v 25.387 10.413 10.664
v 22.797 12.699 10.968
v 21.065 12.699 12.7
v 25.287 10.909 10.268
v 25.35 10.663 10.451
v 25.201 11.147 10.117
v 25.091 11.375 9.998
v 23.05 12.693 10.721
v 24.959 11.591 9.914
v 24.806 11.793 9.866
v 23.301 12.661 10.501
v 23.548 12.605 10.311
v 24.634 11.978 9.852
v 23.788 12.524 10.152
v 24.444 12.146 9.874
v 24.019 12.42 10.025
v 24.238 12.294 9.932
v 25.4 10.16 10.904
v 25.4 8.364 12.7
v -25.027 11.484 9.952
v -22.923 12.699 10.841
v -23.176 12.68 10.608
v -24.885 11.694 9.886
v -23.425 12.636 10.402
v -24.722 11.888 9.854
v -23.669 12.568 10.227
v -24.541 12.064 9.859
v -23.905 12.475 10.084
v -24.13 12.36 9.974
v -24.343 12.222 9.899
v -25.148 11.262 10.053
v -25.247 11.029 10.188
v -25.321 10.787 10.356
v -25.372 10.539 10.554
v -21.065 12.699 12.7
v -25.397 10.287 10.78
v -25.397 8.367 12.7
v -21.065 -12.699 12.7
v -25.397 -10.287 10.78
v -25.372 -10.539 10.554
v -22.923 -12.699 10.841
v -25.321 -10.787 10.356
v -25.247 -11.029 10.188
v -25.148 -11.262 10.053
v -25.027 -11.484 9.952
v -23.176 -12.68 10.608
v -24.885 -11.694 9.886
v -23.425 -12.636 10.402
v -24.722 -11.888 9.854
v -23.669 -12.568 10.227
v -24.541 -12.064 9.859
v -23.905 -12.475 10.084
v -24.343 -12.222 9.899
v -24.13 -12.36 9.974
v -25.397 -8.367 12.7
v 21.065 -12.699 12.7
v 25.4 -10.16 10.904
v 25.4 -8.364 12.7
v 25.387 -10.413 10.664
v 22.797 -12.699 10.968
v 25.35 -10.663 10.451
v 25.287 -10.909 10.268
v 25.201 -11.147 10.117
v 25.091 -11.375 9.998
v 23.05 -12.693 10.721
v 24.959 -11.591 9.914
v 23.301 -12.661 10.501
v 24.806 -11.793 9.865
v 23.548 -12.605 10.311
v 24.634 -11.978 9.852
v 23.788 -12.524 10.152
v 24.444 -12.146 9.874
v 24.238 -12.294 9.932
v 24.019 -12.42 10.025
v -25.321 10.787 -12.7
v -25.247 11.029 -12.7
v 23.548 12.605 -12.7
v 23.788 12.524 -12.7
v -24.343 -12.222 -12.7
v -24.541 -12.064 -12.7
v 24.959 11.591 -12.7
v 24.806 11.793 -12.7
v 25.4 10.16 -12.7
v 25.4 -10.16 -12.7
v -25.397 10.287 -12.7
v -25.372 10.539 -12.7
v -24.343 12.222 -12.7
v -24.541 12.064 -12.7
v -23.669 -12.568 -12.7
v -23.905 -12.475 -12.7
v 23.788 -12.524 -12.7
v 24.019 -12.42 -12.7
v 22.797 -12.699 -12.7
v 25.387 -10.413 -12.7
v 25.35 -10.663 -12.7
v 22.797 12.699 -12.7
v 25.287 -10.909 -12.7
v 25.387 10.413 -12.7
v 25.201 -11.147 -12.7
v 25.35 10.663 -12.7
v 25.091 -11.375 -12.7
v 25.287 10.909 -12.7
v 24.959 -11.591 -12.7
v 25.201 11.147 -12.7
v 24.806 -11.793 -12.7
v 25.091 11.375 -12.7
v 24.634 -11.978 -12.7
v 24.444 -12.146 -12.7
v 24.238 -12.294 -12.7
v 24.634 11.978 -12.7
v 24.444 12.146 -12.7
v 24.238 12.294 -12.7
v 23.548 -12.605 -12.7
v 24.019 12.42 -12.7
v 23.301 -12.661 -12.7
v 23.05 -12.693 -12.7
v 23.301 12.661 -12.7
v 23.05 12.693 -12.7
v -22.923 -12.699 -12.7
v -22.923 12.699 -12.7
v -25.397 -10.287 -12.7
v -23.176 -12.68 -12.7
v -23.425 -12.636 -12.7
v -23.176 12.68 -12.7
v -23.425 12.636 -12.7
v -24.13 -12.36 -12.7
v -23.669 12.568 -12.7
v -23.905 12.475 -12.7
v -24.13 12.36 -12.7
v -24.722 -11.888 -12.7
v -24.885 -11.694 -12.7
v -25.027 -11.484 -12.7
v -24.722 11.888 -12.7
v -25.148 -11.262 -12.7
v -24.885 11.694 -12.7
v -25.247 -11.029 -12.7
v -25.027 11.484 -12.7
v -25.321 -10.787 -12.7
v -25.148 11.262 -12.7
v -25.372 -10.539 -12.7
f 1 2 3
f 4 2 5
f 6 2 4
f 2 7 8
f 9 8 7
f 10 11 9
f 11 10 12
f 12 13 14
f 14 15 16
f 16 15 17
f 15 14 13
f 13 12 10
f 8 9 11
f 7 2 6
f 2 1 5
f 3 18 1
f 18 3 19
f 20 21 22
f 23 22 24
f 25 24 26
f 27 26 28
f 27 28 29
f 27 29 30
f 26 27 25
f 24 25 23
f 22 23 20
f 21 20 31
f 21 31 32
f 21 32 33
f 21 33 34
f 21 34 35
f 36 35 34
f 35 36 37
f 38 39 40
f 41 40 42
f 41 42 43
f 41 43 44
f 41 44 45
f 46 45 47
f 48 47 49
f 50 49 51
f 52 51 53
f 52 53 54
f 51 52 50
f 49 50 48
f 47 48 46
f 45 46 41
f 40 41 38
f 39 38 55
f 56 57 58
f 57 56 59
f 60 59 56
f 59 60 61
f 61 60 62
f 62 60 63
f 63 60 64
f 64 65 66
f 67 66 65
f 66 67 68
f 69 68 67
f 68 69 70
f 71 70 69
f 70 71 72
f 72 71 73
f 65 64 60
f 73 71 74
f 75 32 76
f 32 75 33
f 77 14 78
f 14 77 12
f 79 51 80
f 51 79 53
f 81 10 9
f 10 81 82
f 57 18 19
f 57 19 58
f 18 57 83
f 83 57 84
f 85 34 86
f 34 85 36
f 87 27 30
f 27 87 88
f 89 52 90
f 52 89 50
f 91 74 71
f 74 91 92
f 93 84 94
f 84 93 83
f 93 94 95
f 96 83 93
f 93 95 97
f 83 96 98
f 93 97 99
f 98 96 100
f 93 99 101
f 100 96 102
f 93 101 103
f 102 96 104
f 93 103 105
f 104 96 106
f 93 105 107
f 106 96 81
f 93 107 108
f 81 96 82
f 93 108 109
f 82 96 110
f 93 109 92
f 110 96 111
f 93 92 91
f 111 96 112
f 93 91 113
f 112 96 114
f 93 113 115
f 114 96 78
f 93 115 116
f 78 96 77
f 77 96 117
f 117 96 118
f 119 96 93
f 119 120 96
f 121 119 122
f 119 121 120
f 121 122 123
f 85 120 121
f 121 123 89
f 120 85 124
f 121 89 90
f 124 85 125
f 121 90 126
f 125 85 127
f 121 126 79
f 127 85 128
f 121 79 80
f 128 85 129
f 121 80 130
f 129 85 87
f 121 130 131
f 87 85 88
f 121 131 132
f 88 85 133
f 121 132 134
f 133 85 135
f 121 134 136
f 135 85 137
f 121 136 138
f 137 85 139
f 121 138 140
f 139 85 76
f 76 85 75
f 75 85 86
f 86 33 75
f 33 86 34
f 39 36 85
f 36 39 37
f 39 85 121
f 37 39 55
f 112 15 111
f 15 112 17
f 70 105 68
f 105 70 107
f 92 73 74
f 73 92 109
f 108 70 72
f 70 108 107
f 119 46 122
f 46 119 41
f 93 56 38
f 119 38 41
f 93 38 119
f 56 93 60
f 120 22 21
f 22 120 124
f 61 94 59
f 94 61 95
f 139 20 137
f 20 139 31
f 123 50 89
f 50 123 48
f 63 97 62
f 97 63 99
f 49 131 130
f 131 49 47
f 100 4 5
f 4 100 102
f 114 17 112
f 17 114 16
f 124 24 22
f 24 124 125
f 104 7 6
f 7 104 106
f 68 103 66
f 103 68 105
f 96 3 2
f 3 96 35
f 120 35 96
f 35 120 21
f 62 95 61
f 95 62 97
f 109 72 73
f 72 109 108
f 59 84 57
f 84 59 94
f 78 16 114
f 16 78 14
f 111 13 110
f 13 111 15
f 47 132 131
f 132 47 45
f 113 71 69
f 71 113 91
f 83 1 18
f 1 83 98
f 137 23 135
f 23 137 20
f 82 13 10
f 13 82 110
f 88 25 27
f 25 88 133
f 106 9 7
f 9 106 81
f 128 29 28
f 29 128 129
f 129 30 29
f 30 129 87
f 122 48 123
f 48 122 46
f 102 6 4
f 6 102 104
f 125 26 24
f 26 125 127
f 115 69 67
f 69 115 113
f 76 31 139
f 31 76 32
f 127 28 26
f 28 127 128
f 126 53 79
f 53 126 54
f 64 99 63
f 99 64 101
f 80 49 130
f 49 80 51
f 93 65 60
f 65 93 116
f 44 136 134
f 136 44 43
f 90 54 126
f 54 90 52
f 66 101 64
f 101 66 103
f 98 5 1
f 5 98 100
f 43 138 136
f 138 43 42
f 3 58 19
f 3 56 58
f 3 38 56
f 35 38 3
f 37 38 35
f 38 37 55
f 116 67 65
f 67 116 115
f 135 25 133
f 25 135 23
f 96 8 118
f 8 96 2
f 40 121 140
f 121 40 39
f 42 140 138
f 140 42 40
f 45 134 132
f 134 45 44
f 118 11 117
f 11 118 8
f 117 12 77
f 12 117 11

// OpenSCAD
// Higher definition curves
$fs = 0.01;
$fa = 5;

width = 2;
height = 1;
depth = 1;

radius = 0.1;
corner_offset = (radius*(1 + 1/sqrt(2)));

Points = [
  [ width/2, height/2, depth/2 ],  //0
  [ width/2 - corner_offset, height/2, depth/2 ],  //1
  [ width/2, height/2 - corner_offset, depth/2 ],  //2
  [  width/2, height/2, depth/2 - corner_offset ]  //3
];

module scale_about_pt(s, pt) {
    translate(pt)
        scale(s)
            translate(-pt)
                children();   
}


Faces = [
  [1,0,2],
  [0,1,3],
  [3,2,0],
  [1,2,3],
];

module corner(){
    scale_about_pt(2,[width/2-corner_offset/3, height/2-corner_offset/3, depth/2-corner_offset/3]){
                            polyhedron( Points, Faces);
                        }
}

module roundedcube(size = [1, 1, 1], center = false, radius = 0.5, apply_to = "all") {
    
	// If single value, convert to [x, y, z] vector
	size = (size[0] == undef) ? [size, size, size] : size;

	translate_min = radius;
	translate_xmax = size[0] - radius;
	translate_ymax = size[1] - radius;
	translate_zmax = size[2] - radius;

	diameter = radius * 2;

	module build_point(type = "sphere", rotate = [0, 0, 0]) {
		if (type == "sphere") {
			sphere(r = radius);
		} else if (type == "cylinder") {
			rotate(a = rotate)
			cylinder(h = diameter, r = radius, center = true);
		}
	}

	obj_translate = (center == false) ?
		[0, 0, 0] : [
			-(size[0] / 2),
			-(size[1] / 2),
			-(size[2] / 2)
		];

	translate(v = obj_translate) {
		hull() {
			for (translate_x = [translate_min, translate_xmax]) {
				x_at = (translate_x == translate_min) ? "min" : "max";
				for (translate_y = [translate_min, translate_ymax]) {
					y_at = (translate_y == translate_min) ? "min" : "max";
					for (translate_z = [translate_min, translate_zmax]) {
						z_at = (translate_z == translate_min) ? "min" : "max";

						translate(v = [translate_x, translate_y, translate_z])
						if (
							(apply_to == "all") ||
							(apply_to == "xmin" && x_at == "min") || (apply_to == "xmax" && x_at == "max") ||
							(apply_to == "ymin" && y_at == "min") || (apply_to == "ymax" && y_at == "max") ||
							(apply_to == "zmin" && z_at == "min") || (apply_to == "zmax" && z_at == "max")
						) {
							build_point("sphere");
						} else {
							rotate = 
								(apply_to == "xmin" || apply_to == "xmax" || apply_to == "x") ? [0, 90, 0] : (
								(apply_to == "ymin" || apply_to == "ymax" || apply_to == "y") ? [90, 90, 0] :
								[0, 0, 0]
							);
							build_point("cylinder", rotate);
						}
					}
				}
			}
		}
	}
}

scale(25.4) {
    
    //translate([width/2,height/2,depth/2]) {
        difference() {
    
            roundedcube([width, height, depth], true, 0.1, "z");


            union() {
                mirror([0,0,0]){
                  corner();
                }
                mirror([1,0,0]){
                  corner();
                }
                mirror([1,0,0]){
                  mirror([0,1,0]){
                    corner();
                  }
                }
                mirror([0,1,0]){
                  corner();
                }
            }
        
        }
    //}

}
